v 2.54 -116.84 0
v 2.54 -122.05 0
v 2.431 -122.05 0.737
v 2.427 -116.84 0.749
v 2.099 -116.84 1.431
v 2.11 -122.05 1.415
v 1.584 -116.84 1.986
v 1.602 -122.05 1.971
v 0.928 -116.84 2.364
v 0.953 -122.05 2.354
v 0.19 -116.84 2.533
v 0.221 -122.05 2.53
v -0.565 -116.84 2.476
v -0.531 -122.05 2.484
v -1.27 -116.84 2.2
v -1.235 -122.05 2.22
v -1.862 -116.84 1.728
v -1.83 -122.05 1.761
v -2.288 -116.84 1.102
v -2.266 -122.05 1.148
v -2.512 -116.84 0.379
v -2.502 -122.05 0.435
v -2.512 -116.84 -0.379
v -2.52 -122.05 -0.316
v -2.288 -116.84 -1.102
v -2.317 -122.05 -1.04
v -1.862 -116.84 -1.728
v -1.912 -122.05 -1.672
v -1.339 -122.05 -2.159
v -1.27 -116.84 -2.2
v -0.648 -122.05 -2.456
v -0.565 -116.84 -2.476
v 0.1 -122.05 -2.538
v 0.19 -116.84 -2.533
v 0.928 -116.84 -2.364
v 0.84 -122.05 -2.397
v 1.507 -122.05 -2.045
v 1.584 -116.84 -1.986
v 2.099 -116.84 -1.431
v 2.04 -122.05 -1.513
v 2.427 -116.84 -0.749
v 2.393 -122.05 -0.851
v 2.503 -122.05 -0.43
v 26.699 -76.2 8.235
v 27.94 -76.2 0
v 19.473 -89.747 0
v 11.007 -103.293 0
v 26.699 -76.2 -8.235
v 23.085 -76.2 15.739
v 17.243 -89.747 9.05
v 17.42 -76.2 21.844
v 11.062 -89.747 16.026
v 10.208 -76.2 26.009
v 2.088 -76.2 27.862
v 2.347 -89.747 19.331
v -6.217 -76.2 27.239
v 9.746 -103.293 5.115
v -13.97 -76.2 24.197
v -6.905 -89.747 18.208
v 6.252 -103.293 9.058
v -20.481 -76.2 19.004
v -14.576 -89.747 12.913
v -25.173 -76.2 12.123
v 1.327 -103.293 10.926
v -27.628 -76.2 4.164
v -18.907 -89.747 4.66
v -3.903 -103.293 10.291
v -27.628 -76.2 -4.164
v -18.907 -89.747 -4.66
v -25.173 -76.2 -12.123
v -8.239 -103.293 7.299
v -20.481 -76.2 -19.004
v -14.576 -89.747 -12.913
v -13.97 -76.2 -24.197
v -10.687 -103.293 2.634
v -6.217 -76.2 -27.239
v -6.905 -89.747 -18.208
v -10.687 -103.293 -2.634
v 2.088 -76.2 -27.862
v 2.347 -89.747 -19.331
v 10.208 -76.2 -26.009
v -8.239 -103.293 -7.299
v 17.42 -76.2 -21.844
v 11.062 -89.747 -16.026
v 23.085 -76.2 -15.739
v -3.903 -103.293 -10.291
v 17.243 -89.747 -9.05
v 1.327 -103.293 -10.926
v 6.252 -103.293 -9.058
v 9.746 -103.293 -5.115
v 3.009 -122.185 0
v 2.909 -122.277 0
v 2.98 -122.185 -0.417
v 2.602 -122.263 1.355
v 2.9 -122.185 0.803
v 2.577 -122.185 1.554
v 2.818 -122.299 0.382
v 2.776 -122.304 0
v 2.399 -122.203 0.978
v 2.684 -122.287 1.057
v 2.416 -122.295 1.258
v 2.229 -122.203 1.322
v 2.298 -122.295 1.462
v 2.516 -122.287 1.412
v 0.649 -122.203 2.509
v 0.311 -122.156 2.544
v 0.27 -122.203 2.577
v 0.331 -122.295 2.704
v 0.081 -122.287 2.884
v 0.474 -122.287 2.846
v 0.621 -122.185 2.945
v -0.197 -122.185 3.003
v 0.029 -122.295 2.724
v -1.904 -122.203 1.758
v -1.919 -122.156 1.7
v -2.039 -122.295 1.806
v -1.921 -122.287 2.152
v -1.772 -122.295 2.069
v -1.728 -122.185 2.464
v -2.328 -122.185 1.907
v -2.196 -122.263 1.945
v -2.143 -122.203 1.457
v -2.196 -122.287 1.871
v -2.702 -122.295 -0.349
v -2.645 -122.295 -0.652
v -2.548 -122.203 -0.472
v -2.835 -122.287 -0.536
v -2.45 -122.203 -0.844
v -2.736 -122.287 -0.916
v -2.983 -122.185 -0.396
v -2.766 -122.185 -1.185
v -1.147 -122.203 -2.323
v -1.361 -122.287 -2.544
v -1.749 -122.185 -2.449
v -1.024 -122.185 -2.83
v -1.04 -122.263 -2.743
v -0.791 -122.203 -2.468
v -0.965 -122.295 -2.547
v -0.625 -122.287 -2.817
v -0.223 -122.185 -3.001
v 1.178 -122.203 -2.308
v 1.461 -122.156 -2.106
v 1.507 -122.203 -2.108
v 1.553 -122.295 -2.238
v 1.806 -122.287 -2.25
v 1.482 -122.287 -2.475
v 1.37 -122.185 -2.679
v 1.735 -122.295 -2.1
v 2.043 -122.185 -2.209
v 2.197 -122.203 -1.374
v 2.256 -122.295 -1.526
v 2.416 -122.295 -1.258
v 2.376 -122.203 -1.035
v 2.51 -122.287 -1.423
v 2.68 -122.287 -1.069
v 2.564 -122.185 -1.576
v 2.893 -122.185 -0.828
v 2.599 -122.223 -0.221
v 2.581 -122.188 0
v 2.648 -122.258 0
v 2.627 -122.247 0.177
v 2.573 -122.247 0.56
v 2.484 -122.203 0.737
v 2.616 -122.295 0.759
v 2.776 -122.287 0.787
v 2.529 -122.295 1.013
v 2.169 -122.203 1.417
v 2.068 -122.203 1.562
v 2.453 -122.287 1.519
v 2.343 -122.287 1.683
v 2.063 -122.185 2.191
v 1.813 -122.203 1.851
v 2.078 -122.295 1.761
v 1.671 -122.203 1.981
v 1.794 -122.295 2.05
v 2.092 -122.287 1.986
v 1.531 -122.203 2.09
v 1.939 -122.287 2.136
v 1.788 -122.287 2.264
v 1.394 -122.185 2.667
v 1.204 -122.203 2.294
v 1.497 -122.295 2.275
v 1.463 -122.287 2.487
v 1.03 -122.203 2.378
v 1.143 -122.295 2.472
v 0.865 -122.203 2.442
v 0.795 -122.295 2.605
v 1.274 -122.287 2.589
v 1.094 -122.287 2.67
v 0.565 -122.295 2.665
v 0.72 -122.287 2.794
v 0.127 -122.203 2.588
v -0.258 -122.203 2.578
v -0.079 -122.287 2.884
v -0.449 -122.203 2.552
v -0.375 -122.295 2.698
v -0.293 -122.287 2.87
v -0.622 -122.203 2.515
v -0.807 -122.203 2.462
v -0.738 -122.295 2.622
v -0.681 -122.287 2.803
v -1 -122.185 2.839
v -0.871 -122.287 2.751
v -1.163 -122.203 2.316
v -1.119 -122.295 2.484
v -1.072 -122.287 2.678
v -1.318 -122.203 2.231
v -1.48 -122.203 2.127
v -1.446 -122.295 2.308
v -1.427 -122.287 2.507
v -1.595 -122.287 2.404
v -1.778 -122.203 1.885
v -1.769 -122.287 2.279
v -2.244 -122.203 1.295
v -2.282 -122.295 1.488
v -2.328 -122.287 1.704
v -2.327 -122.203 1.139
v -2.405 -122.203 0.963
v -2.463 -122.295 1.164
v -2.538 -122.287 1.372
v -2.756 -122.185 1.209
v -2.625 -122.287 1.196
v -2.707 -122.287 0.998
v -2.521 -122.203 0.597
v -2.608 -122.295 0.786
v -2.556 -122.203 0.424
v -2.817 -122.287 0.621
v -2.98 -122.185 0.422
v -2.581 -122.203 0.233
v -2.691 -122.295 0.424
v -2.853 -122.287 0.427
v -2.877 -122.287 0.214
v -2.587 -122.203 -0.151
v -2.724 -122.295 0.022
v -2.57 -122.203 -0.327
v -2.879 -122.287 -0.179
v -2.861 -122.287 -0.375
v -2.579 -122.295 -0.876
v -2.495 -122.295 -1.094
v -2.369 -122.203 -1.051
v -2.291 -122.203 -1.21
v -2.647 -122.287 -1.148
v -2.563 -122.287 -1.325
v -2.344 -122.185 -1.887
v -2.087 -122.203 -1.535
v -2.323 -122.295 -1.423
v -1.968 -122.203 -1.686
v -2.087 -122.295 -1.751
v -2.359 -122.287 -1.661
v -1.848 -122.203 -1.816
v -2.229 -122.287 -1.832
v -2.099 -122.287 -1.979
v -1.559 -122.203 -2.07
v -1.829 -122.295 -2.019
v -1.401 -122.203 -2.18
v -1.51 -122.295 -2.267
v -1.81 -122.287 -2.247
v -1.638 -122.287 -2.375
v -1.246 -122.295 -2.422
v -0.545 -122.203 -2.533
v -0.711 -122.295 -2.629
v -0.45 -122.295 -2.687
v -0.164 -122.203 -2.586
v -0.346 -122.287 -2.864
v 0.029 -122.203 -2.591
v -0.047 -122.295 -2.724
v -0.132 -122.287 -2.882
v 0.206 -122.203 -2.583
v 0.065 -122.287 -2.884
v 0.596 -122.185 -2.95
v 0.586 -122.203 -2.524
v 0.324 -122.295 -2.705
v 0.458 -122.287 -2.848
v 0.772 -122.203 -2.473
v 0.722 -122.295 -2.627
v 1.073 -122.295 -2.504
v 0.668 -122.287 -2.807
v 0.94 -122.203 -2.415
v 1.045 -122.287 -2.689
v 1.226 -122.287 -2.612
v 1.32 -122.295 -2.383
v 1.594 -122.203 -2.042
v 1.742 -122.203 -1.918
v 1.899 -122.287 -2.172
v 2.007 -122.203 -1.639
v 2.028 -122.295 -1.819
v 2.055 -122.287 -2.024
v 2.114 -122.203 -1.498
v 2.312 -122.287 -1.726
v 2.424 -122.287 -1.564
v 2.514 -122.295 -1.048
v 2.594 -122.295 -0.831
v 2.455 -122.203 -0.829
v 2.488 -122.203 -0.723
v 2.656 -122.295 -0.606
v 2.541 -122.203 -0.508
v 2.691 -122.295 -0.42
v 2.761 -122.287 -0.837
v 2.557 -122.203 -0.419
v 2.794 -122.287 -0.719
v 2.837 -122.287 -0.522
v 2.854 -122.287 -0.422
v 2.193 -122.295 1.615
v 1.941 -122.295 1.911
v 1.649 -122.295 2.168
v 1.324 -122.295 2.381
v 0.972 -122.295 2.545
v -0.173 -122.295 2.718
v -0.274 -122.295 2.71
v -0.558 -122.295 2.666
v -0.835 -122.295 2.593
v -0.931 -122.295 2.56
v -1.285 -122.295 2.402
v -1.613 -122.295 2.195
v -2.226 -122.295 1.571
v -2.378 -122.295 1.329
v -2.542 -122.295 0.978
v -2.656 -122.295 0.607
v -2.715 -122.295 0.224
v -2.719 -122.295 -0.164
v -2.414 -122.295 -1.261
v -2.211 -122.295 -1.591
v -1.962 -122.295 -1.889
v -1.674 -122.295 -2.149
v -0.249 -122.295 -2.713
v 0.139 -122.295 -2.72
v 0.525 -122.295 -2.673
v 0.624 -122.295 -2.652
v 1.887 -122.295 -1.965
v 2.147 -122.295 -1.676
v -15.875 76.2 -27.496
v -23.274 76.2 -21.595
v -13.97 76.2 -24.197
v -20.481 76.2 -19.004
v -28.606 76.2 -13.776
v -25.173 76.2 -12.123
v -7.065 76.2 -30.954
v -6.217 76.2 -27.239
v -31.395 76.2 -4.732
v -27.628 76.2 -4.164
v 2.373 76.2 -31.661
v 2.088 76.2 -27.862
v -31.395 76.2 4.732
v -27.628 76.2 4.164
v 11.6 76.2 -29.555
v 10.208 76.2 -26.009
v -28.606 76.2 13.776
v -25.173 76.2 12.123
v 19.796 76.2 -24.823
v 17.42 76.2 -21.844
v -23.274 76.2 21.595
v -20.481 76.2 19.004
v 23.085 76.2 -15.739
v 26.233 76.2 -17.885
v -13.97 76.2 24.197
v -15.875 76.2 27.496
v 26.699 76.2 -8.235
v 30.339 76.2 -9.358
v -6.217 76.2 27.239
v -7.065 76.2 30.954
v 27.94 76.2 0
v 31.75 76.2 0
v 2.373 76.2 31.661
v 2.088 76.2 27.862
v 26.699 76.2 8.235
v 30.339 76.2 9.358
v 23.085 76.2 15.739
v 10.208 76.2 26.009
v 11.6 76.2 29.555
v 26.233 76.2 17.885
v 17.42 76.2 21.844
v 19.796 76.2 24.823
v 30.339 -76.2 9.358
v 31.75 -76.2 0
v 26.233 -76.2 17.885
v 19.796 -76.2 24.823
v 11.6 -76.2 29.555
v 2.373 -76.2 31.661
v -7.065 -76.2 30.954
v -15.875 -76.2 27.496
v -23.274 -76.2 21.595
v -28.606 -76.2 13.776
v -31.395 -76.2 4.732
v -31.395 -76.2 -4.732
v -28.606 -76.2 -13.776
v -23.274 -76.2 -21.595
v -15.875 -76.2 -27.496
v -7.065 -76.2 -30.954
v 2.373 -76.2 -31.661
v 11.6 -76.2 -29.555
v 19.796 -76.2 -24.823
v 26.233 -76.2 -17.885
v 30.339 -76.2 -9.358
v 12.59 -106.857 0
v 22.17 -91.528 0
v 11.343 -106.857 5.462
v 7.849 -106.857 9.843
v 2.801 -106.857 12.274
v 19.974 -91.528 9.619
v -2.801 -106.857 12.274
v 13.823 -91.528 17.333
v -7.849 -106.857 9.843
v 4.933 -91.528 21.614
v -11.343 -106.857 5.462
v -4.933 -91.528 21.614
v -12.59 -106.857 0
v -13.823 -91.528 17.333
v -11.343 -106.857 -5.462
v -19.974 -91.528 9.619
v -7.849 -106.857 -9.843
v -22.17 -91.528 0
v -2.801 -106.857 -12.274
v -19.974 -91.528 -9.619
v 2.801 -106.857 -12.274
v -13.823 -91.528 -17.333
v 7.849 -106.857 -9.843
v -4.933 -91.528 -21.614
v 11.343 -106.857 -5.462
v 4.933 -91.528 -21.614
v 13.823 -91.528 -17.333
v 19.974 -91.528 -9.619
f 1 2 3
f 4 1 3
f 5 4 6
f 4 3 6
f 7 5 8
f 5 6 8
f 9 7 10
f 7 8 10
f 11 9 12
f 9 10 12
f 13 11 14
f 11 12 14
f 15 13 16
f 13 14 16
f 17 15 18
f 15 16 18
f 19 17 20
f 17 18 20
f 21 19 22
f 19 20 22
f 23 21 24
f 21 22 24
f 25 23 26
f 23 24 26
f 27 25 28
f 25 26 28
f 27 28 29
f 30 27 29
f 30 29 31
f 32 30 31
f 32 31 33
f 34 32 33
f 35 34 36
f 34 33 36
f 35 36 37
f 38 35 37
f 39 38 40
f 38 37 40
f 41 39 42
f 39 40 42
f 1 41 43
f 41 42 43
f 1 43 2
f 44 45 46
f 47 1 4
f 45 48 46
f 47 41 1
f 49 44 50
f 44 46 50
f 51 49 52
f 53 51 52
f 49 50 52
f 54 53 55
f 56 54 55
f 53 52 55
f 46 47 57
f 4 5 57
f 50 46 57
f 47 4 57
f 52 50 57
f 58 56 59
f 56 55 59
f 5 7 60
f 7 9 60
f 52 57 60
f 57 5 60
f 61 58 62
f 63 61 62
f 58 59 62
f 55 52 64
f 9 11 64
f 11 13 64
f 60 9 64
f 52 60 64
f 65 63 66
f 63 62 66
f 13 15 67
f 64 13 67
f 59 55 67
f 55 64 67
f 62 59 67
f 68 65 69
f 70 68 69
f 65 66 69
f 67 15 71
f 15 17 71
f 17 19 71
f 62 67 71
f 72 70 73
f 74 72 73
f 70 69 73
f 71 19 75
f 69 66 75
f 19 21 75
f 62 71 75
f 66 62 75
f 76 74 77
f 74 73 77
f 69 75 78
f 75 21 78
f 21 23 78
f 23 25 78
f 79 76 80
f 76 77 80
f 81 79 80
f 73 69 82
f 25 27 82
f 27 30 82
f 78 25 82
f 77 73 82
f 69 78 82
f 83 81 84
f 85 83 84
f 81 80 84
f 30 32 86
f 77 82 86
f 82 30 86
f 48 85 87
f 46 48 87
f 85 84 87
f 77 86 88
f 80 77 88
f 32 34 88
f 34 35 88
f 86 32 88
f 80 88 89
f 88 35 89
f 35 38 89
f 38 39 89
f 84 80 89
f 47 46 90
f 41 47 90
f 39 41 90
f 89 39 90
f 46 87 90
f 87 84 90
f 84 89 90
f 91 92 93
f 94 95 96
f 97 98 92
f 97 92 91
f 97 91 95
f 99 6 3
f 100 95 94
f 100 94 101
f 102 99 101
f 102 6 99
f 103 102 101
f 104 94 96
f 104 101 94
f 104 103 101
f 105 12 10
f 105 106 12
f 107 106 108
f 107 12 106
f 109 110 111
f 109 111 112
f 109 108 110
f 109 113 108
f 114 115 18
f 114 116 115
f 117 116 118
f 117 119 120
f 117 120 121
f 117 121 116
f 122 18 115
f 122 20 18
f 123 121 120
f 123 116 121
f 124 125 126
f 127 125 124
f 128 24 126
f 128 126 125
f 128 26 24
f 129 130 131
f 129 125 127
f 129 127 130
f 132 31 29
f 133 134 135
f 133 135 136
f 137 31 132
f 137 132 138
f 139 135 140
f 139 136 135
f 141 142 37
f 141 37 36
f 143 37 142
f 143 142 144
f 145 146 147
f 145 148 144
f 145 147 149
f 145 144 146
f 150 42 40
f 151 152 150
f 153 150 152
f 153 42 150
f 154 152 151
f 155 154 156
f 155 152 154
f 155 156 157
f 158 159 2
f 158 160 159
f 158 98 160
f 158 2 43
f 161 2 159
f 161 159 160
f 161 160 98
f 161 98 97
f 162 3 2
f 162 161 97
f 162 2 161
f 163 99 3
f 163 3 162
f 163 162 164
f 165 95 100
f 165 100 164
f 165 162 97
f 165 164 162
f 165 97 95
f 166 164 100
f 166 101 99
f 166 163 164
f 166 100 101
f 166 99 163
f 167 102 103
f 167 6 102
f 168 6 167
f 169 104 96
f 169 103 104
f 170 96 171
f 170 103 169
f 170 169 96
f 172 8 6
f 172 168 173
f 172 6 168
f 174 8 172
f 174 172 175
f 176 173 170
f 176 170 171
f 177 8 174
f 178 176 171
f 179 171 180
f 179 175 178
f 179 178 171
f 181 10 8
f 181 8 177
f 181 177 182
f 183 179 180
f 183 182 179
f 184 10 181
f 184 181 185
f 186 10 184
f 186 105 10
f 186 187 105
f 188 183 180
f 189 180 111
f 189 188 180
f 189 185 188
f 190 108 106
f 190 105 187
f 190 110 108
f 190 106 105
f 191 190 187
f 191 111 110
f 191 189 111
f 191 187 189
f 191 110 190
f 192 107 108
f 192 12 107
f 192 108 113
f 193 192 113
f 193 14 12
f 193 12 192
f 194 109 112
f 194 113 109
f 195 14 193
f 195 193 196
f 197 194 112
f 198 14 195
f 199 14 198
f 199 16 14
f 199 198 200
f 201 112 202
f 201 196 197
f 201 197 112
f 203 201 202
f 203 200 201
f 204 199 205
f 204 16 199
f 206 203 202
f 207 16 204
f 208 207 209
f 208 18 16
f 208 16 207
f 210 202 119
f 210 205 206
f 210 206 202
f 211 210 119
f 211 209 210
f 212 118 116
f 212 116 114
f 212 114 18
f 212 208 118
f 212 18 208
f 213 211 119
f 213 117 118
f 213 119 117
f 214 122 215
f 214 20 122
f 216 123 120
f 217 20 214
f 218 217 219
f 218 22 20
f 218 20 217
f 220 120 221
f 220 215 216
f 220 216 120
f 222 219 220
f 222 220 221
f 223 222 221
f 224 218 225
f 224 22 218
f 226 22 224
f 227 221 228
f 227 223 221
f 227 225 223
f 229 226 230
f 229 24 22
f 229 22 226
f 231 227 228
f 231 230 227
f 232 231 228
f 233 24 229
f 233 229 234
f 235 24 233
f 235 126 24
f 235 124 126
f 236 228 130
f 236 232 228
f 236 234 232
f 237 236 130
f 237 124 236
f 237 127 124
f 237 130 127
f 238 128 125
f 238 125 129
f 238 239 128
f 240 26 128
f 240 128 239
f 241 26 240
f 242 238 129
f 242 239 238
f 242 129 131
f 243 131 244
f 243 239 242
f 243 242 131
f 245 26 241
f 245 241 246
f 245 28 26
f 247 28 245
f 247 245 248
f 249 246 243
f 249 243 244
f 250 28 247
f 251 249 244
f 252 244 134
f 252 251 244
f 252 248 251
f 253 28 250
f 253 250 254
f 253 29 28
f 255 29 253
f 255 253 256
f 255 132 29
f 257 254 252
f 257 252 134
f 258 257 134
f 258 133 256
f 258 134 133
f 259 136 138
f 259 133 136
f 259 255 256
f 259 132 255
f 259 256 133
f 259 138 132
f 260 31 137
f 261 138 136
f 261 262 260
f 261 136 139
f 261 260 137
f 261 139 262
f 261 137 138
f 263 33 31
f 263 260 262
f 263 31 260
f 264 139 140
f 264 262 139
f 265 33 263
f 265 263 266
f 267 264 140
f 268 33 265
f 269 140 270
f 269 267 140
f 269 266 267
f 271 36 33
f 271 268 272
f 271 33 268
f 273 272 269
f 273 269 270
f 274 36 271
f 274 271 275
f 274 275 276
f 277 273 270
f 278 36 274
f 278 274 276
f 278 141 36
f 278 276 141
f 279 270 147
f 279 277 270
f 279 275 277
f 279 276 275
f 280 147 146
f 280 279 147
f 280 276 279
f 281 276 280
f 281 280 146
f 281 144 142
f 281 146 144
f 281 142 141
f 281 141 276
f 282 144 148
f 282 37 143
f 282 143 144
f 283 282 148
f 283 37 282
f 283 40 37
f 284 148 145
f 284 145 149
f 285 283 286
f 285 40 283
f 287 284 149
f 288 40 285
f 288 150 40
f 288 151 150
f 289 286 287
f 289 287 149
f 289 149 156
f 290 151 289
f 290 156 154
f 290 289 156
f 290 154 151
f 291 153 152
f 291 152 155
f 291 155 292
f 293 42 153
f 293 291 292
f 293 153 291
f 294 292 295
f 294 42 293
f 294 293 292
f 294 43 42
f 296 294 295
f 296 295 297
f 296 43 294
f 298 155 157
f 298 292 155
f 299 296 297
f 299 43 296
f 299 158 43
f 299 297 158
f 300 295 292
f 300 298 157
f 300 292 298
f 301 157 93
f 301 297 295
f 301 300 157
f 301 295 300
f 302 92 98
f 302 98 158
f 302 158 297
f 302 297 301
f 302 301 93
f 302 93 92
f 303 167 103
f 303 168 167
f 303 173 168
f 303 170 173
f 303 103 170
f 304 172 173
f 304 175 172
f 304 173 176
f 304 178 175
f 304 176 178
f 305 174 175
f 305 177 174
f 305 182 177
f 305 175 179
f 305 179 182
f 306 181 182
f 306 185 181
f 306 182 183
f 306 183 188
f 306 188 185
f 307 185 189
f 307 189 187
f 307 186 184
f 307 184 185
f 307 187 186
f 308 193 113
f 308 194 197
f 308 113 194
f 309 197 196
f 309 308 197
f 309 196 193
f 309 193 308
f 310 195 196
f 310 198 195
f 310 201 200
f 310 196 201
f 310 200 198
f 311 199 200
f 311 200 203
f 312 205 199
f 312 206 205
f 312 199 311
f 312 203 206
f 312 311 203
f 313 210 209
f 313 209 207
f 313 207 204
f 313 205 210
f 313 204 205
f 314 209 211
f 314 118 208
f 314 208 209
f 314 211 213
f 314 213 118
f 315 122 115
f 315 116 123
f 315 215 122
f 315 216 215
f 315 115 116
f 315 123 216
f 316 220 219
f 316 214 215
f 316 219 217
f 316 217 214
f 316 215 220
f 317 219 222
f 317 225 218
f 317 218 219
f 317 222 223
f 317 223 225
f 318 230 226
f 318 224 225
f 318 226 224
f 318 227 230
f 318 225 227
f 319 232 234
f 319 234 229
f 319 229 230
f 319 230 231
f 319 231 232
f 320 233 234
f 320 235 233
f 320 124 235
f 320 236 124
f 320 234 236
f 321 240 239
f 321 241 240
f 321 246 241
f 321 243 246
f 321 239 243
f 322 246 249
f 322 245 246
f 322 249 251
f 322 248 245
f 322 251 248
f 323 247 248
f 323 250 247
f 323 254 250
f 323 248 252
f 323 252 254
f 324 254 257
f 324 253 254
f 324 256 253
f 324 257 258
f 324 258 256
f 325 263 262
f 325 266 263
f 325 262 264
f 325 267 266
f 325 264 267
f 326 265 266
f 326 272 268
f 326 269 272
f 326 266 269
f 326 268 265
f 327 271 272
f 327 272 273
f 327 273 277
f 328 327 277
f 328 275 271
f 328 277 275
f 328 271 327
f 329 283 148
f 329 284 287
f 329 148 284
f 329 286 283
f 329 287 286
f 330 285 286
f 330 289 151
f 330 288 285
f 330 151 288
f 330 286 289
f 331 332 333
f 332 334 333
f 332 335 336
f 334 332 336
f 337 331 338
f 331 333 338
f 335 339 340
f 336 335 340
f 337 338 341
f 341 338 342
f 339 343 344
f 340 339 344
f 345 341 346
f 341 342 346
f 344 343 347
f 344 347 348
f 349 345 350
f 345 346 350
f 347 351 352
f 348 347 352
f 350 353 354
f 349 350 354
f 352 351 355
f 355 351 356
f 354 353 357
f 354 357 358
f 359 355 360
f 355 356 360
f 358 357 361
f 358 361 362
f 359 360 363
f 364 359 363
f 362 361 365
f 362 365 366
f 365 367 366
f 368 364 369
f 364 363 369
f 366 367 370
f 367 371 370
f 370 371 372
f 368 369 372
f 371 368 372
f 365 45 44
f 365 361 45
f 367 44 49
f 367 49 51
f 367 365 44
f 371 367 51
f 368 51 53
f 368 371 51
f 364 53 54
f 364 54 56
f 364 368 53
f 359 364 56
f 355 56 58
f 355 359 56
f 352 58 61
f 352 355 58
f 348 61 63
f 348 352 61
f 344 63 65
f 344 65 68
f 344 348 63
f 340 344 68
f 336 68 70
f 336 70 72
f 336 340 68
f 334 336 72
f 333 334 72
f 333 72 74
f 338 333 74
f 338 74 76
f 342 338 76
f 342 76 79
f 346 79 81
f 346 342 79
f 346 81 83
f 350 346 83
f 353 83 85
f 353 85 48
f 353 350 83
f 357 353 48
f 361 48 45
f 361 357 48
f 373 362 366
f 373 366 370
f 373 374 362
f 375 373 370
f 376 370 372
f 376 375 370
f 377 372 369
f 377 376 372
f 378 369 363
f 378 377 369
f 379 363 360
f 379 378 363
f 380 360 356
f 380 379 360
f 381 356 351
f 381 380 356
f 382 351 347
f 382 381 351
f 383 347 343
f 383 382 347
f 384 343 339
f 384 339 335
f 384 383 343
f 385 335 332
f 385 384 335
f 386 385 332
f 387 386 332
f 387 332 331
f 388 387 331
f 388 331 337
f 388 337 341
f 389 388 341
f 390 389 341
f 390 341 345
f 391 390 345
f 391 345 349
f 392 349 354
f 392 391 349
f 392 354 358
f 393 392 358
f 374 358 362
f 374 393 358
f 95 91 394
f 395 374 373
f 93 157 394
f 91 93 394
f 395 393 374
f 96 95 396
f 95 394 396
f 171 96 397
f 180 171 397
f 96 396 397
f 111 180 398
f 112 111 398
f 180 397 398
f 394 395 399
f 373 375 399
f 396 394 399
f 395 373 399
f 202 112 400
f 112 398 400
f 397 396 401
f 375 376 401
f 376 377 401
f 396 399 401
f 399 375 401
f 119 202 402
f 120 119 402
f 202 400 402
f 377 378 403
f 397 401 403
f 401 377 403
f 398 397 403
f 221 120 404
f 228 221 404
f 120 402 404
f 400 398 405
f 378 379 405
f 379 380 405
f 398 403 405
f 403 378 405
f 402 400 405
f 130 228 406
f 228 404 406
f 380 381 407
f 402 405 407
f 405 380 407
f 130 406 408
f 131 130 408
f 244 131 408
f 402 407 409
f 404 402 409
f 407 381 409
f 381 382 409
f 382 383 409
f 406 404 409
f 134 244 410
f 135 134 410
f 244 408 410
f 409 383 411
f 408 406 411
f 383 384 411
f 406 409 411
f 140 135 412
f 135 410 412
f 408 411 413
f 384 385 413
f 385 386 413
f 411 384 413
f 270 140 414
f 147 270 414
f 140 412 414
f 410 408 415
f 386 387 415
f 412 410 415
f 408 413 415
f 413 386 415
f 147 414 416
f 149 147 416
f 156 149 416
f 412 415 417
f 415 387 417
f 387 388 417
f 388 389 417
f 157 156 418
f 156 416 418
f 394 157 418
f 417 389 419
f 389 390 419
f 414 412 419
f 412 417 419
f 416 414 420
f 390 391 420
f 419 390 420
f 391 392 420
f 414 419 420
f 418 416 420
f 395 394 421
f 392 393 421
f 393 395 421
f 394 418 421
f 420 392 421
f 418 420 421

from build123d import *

# Parameters (mm, degrees)
F0_R     = 31.75
F0_R_2   = 27.94
F1_DEPTH = 76.2
F4_R     = 0.254


with BuildPart() as f1:
    # F0 (on Front) → F1 (new body, symmetric)
    with BuildSketch(Plane.XZ):
        Circle(F0_R)
        Circle(F0_R_2, mode=Mode.SUBTRACT)
    extrude(amount=F1_DEPTH, both=True)

    # F2 (on Top) → F3 (revolve)
    with BuildSketch(Plane.XY):
        Polygon((31.75, -76.2), (27.94, -76.2), (2.54, -116.84), (2.54, -122.936), align=None)
    revolve(axis=Axis((0, -64.747475, 0), (0, -1, 0)))

    # F4
    f4_edges = [f1.edges().sort_by_distance(p)[0] for p in [
        (-2.54, -122.936, 0),
    ]]
    fillet(f4_edges, radius=F4_R)


solid = f1.part
